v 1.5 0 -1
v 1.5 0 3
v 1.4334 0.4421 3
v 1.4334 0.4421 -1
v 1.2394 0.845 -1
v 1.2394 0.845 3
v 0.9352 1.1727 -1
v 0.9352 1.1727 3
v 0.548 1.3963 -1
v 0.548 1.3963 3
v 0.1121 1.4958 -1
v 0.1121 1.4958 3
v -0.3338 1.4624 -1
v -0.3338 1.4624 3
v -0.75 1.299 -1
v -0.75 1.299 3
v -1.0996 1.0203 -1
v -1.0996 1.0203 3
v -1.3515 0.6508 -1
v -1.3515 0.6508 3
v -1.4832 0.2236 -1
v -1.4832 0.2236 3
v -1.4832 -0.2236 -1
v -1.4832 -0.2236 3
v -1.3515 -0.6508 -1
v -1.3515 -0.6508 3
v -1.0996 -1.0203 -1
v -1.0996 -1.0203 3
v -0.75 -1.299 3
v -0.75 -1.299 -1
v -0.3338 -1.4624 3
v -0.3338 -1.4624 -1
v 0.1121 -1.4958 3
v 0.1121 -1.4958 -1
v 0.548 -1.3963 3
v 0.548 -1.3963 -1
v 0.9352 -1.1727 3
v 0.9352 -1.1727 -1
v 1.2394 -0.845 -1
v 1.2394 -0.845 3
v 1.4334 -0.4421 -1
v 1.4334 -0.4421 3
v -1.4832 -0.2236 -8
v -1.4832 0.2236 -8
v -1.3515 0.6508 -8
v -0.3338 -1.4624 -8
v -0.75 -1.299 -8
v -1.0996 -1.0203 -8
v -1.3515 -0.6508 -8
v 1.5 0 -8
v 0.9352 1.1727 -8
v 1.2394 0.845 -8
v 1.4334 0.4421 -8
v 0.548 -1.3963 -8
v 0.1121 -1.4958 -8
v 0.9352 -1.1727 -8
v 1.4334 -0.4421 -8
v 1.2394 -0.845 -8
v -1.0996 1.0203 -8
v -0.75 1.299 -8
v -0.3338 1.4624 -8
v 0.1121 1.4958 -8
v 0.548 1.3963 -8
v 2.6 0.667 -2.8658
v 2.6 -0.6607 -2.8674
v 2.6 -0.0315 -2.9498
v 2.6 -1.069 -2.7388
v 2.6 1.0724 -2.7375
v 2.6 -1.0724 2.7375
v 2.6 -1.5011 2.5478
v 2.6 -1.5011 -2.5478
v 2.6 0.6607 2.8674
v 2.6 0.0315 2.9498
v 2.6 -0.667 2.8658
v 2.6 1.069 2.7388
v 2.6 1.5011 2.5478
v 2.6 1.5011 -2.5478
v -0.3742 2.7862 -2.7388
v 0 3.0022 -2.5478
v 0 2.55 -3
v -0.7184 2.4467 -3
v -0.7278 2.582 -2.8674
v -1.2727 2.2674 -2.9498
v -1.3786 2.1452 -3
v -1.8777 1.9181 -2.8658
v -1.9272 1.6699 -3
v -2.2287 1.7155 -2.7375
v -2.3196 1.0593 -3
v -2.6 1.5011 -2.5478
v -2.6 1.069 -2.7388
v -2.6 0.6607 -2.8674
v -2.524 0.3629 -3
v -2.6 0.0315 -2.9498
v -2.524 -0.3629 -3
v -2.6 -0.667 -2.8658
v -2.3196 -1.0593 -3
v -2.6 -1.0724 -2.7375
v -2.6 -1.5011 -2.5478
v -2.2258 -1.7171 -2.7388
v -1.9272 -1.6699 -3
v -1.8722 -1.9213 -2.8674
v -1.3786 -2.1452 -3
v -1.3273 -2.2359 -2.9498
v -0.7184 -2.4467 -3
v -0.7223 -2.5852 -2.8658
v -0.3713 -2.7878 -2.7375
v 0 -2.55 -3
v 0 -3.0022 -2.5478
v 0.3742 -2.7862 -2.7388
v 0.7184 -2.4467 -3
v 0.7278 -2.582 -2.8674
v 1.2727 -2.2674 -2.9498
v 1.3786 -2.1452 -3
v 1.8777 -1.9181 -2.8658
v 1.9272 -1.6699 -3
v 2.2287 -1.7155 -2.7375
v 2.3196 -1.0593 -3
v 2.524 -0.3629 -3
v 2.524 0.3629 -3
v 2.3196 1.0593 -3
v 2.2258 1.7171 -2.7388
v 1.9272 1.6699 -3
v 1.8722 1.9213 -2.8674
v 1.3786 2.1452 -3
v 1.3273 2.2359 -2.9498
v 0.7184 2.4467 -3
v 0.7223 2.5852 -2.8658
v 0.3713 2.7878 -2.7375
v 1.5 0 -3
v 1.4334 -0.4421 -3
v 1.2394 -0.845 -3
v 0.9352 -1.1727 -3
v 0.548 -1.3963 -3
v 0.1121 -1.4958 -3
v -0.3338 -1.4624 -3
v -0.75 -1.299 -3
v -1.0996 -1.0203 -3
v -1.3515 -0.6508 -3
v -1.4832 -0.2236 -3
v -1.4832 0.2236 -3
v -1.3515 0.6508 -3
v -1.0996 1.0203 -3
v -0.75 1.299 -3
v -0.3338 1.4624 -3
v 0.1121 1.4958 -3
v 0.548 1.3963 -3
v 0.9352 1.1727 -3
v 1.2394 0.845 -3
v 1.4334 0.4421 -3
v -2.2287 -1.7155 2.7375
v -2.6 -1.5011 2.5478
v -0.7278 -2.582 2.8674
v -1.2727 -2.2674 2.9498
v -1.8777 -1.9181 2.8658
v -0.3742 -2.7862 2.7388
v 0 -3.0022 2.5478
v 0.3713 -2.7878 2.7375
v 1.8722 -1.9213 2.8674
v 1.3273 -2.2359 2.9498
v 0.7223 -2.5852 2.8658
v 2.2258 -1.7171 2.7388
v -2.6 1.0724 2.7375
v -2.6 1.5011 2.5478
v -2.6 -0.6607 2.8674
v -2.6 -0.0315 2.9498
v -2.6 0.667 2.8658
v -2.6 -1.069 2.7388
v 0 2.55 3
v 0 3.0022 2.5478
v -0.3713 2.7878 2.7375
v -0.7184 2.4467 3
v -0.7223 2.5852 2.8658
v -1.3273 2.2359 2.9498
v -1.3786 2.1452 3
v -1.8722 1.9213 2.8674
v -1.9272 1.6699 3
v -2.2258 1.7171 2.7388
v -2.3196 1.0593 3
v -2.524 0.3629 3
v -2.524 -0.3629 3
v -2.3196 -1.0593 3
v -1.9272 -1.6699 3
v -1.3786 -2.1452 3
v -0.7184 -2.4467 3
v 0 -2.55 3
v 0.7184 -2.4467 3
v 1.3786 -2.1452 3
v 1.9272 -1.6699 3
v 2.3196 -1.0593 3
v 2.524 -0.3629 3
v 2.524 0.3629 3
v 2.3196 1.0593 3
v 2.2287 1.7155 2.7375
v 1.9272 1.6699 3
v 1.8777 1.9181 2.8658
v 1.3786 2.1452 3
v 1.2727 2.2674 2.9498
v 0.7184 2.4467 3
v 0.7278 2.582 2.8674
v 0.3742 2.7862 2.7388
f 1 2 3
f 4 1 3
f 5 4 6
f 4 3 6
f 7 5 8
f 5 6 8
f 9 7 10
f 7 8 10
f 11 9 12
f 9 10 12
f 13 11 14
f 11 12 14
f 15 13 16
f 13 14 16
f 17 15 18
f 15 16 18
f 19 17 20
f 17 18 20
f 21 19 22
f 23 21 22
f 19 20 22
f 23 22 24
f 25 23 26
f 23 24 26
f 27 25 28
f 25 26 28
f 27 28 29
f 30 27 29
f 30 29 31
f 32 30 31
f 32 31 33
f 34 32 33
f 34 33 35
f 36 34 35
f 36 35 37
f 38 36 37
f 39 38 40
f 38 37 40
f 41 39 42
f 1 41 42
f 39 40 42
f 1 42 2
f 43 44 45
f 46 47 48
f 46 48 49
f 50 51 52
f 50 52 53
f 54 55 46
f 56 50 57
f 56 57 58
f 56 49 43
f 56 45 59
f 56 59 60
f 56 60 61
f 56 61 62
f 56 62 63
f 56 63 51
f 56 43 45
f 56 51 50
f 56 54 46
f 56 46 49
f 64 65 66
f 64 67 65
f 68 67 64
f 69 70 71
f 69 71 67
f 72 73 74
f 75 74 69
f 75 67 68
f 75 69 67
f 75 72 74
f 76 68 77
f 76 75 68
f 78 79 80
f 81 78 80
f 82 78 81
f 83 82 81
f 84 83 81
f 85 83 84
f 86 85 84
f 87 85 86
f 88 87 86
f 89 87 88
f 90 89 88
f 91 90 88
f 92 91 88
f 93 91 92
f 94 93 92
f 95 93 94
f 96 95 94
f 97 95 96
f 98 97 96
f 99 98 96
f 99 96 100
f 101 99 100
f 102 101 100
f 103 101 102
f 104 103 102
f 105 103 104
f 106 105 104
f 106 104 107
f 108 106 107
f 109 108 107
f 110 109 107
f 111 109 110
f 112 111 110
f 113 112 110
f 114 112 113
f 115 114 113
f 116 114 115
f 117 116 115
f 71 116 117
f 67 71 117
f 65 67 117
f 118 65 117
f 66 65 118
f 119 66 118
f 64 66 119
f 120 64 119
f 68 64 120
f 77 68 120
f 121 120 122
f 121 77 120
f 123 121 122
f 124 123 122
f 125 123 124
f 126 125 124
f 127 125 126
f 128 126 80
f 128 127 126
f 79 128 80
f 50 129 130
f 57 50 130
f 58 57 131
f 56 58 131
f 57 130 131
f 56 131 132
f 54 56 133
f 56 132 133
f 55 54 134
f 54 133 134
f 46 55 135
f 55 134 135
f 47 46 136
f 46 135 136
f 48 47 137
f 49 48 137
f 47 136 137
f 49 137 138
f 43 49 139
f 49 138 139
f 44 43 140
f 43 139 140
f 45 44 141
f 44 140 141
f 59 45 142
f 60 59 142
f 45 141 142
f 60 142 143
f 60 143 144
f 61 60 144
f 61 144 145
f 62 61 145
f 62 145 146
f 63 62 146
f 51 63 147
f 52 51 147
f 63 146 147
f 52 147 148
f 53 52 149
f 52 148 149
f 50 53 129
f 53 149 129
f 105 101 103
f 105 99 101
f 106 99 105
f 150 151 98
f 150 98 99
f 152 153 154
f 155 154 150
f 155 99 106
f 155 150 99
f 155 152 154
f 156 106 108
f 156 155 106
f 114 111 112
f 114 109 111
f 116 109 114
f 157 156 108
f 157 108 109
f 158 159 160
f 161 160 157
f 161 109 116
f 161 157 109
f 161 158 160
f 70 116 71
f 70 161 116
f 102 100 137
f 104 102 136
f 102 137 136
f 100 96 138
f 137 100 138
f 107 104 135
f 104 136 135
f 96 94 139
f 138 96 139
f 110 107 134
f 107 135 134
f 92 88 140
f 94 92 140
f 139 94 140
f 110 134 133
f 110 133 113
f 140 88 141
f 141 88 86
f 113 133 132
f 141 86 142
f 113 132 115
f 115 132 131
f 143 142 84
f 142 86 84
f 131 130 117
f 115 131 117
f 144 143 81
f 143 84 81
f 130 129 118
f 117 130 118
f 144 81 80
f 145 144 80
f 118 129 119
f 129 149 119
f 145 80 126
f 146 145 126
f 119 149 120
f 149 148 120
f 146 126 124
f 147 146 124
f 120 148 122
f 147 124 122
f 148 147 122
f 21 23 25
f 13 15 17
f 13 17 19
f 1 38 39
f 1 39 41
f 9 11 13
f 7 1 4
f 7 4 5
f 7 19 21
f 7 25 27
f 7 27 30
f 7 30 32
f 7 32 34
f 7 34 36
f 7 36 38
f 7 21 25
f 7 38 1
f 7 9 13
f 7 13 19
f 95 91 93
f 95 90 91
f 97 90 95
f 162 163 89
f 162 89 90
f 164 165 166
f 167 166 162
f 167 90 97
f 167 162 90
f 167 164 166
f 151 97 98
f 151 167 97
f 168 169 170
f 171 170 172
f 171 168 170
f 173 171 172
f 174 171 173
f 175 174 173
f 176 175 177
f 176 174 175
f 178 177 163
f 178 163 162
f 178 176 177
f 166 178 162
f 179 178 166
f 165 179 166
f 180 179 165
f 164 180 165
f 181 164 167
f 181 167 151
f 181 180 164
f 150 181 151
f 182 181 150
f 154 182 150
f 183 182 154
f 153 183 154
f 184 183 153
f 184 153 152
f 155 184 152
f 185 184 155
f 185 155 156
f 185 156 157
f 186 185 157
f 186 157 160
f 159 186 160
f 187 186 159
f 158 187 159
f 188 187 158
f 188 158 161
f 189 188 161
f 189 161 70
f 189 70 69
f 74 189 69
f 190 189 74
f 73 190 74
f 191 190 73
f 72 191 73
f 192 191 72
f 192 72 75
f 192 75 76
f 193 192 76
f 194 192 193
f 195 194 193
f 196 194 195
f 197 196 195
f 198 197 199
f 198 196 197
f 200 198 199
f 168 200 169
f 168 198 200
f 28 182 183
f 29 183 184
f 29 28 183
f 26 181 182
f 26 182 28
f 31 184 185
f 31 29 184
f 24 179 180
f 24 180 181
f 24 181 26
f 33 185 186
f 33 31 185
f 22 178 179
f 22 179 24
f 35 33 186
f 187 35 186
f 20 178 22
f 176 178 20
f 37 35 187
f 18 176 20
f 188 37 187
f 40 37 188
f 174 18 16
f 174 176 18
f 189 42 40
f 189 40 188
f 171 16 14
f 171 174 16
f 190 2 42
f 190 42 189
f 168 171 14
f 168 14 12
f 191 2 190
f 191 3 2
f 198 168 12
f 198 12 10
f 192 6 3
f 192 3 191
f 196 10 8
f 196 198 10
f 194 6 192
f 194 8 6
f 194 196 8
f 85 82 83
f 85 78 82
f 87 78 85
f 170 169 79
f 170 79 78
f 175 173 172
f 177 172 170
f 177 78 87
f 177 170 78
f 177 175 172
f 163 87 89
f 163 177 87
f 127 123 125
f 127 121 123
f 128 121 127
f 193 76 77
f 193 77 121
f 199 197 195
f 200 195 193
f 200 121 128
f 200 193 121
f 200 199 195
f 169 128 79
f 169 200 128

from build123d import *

# Parameters (mm, degrees)
PAD_DEPTH    = 3
SKETCH001_R  = 1.5
POCKET_DEPTH = 4
SKETCH004_R  = 1.5
PAD001_DEPTH = 5


with BuildPart() as part:
    # Sketch → Pad (new body, symmetric)
    with BuildSketch(Plane.XY):
        Polygon((2.6, 1.501111), (0, 3.002221), (-2.6, 1.501111), (-2.6, -1.501111), (0, -3.002221), (2.6, -1.501111), align=None)
    extrude(amount=PAD_DEPTH, both=True)

    # Sketch001 (on Face8 of Pad) → Pocket (cut)
    with BuildSketch(Plane.XY.offset(3)):
        Circle(SKETCH001_R)
    extrude(amount=-POCKET_DEPTH, mode=Mode.SUBTRACT)

    # Sketch004 (on Face4 of Pocket) → Pad001 (join)
    with BuildSketch(Plane(origin=(0, 0, -3), x_dir=(1, 0, 0), z_dir=(0, 0, -1))):
        Circle(SKETCH004_R)
    extrude(amount=PAD001_DEPTH)

    # Sketch006 → Groove (revolve, cut)
    with BuildSketch(Plane.YZ):
        Polygon((1.8, 3.75), (4.8, 3.75), (4.8, -3.75), (1.8, -3.75), (3.55, -2), (3.55, 2), align=None)
    revolve(axis=Axis((0, 0, 0), (0, 0, 1)), mode=Mode.SUBTRACT)


solid = part.part
